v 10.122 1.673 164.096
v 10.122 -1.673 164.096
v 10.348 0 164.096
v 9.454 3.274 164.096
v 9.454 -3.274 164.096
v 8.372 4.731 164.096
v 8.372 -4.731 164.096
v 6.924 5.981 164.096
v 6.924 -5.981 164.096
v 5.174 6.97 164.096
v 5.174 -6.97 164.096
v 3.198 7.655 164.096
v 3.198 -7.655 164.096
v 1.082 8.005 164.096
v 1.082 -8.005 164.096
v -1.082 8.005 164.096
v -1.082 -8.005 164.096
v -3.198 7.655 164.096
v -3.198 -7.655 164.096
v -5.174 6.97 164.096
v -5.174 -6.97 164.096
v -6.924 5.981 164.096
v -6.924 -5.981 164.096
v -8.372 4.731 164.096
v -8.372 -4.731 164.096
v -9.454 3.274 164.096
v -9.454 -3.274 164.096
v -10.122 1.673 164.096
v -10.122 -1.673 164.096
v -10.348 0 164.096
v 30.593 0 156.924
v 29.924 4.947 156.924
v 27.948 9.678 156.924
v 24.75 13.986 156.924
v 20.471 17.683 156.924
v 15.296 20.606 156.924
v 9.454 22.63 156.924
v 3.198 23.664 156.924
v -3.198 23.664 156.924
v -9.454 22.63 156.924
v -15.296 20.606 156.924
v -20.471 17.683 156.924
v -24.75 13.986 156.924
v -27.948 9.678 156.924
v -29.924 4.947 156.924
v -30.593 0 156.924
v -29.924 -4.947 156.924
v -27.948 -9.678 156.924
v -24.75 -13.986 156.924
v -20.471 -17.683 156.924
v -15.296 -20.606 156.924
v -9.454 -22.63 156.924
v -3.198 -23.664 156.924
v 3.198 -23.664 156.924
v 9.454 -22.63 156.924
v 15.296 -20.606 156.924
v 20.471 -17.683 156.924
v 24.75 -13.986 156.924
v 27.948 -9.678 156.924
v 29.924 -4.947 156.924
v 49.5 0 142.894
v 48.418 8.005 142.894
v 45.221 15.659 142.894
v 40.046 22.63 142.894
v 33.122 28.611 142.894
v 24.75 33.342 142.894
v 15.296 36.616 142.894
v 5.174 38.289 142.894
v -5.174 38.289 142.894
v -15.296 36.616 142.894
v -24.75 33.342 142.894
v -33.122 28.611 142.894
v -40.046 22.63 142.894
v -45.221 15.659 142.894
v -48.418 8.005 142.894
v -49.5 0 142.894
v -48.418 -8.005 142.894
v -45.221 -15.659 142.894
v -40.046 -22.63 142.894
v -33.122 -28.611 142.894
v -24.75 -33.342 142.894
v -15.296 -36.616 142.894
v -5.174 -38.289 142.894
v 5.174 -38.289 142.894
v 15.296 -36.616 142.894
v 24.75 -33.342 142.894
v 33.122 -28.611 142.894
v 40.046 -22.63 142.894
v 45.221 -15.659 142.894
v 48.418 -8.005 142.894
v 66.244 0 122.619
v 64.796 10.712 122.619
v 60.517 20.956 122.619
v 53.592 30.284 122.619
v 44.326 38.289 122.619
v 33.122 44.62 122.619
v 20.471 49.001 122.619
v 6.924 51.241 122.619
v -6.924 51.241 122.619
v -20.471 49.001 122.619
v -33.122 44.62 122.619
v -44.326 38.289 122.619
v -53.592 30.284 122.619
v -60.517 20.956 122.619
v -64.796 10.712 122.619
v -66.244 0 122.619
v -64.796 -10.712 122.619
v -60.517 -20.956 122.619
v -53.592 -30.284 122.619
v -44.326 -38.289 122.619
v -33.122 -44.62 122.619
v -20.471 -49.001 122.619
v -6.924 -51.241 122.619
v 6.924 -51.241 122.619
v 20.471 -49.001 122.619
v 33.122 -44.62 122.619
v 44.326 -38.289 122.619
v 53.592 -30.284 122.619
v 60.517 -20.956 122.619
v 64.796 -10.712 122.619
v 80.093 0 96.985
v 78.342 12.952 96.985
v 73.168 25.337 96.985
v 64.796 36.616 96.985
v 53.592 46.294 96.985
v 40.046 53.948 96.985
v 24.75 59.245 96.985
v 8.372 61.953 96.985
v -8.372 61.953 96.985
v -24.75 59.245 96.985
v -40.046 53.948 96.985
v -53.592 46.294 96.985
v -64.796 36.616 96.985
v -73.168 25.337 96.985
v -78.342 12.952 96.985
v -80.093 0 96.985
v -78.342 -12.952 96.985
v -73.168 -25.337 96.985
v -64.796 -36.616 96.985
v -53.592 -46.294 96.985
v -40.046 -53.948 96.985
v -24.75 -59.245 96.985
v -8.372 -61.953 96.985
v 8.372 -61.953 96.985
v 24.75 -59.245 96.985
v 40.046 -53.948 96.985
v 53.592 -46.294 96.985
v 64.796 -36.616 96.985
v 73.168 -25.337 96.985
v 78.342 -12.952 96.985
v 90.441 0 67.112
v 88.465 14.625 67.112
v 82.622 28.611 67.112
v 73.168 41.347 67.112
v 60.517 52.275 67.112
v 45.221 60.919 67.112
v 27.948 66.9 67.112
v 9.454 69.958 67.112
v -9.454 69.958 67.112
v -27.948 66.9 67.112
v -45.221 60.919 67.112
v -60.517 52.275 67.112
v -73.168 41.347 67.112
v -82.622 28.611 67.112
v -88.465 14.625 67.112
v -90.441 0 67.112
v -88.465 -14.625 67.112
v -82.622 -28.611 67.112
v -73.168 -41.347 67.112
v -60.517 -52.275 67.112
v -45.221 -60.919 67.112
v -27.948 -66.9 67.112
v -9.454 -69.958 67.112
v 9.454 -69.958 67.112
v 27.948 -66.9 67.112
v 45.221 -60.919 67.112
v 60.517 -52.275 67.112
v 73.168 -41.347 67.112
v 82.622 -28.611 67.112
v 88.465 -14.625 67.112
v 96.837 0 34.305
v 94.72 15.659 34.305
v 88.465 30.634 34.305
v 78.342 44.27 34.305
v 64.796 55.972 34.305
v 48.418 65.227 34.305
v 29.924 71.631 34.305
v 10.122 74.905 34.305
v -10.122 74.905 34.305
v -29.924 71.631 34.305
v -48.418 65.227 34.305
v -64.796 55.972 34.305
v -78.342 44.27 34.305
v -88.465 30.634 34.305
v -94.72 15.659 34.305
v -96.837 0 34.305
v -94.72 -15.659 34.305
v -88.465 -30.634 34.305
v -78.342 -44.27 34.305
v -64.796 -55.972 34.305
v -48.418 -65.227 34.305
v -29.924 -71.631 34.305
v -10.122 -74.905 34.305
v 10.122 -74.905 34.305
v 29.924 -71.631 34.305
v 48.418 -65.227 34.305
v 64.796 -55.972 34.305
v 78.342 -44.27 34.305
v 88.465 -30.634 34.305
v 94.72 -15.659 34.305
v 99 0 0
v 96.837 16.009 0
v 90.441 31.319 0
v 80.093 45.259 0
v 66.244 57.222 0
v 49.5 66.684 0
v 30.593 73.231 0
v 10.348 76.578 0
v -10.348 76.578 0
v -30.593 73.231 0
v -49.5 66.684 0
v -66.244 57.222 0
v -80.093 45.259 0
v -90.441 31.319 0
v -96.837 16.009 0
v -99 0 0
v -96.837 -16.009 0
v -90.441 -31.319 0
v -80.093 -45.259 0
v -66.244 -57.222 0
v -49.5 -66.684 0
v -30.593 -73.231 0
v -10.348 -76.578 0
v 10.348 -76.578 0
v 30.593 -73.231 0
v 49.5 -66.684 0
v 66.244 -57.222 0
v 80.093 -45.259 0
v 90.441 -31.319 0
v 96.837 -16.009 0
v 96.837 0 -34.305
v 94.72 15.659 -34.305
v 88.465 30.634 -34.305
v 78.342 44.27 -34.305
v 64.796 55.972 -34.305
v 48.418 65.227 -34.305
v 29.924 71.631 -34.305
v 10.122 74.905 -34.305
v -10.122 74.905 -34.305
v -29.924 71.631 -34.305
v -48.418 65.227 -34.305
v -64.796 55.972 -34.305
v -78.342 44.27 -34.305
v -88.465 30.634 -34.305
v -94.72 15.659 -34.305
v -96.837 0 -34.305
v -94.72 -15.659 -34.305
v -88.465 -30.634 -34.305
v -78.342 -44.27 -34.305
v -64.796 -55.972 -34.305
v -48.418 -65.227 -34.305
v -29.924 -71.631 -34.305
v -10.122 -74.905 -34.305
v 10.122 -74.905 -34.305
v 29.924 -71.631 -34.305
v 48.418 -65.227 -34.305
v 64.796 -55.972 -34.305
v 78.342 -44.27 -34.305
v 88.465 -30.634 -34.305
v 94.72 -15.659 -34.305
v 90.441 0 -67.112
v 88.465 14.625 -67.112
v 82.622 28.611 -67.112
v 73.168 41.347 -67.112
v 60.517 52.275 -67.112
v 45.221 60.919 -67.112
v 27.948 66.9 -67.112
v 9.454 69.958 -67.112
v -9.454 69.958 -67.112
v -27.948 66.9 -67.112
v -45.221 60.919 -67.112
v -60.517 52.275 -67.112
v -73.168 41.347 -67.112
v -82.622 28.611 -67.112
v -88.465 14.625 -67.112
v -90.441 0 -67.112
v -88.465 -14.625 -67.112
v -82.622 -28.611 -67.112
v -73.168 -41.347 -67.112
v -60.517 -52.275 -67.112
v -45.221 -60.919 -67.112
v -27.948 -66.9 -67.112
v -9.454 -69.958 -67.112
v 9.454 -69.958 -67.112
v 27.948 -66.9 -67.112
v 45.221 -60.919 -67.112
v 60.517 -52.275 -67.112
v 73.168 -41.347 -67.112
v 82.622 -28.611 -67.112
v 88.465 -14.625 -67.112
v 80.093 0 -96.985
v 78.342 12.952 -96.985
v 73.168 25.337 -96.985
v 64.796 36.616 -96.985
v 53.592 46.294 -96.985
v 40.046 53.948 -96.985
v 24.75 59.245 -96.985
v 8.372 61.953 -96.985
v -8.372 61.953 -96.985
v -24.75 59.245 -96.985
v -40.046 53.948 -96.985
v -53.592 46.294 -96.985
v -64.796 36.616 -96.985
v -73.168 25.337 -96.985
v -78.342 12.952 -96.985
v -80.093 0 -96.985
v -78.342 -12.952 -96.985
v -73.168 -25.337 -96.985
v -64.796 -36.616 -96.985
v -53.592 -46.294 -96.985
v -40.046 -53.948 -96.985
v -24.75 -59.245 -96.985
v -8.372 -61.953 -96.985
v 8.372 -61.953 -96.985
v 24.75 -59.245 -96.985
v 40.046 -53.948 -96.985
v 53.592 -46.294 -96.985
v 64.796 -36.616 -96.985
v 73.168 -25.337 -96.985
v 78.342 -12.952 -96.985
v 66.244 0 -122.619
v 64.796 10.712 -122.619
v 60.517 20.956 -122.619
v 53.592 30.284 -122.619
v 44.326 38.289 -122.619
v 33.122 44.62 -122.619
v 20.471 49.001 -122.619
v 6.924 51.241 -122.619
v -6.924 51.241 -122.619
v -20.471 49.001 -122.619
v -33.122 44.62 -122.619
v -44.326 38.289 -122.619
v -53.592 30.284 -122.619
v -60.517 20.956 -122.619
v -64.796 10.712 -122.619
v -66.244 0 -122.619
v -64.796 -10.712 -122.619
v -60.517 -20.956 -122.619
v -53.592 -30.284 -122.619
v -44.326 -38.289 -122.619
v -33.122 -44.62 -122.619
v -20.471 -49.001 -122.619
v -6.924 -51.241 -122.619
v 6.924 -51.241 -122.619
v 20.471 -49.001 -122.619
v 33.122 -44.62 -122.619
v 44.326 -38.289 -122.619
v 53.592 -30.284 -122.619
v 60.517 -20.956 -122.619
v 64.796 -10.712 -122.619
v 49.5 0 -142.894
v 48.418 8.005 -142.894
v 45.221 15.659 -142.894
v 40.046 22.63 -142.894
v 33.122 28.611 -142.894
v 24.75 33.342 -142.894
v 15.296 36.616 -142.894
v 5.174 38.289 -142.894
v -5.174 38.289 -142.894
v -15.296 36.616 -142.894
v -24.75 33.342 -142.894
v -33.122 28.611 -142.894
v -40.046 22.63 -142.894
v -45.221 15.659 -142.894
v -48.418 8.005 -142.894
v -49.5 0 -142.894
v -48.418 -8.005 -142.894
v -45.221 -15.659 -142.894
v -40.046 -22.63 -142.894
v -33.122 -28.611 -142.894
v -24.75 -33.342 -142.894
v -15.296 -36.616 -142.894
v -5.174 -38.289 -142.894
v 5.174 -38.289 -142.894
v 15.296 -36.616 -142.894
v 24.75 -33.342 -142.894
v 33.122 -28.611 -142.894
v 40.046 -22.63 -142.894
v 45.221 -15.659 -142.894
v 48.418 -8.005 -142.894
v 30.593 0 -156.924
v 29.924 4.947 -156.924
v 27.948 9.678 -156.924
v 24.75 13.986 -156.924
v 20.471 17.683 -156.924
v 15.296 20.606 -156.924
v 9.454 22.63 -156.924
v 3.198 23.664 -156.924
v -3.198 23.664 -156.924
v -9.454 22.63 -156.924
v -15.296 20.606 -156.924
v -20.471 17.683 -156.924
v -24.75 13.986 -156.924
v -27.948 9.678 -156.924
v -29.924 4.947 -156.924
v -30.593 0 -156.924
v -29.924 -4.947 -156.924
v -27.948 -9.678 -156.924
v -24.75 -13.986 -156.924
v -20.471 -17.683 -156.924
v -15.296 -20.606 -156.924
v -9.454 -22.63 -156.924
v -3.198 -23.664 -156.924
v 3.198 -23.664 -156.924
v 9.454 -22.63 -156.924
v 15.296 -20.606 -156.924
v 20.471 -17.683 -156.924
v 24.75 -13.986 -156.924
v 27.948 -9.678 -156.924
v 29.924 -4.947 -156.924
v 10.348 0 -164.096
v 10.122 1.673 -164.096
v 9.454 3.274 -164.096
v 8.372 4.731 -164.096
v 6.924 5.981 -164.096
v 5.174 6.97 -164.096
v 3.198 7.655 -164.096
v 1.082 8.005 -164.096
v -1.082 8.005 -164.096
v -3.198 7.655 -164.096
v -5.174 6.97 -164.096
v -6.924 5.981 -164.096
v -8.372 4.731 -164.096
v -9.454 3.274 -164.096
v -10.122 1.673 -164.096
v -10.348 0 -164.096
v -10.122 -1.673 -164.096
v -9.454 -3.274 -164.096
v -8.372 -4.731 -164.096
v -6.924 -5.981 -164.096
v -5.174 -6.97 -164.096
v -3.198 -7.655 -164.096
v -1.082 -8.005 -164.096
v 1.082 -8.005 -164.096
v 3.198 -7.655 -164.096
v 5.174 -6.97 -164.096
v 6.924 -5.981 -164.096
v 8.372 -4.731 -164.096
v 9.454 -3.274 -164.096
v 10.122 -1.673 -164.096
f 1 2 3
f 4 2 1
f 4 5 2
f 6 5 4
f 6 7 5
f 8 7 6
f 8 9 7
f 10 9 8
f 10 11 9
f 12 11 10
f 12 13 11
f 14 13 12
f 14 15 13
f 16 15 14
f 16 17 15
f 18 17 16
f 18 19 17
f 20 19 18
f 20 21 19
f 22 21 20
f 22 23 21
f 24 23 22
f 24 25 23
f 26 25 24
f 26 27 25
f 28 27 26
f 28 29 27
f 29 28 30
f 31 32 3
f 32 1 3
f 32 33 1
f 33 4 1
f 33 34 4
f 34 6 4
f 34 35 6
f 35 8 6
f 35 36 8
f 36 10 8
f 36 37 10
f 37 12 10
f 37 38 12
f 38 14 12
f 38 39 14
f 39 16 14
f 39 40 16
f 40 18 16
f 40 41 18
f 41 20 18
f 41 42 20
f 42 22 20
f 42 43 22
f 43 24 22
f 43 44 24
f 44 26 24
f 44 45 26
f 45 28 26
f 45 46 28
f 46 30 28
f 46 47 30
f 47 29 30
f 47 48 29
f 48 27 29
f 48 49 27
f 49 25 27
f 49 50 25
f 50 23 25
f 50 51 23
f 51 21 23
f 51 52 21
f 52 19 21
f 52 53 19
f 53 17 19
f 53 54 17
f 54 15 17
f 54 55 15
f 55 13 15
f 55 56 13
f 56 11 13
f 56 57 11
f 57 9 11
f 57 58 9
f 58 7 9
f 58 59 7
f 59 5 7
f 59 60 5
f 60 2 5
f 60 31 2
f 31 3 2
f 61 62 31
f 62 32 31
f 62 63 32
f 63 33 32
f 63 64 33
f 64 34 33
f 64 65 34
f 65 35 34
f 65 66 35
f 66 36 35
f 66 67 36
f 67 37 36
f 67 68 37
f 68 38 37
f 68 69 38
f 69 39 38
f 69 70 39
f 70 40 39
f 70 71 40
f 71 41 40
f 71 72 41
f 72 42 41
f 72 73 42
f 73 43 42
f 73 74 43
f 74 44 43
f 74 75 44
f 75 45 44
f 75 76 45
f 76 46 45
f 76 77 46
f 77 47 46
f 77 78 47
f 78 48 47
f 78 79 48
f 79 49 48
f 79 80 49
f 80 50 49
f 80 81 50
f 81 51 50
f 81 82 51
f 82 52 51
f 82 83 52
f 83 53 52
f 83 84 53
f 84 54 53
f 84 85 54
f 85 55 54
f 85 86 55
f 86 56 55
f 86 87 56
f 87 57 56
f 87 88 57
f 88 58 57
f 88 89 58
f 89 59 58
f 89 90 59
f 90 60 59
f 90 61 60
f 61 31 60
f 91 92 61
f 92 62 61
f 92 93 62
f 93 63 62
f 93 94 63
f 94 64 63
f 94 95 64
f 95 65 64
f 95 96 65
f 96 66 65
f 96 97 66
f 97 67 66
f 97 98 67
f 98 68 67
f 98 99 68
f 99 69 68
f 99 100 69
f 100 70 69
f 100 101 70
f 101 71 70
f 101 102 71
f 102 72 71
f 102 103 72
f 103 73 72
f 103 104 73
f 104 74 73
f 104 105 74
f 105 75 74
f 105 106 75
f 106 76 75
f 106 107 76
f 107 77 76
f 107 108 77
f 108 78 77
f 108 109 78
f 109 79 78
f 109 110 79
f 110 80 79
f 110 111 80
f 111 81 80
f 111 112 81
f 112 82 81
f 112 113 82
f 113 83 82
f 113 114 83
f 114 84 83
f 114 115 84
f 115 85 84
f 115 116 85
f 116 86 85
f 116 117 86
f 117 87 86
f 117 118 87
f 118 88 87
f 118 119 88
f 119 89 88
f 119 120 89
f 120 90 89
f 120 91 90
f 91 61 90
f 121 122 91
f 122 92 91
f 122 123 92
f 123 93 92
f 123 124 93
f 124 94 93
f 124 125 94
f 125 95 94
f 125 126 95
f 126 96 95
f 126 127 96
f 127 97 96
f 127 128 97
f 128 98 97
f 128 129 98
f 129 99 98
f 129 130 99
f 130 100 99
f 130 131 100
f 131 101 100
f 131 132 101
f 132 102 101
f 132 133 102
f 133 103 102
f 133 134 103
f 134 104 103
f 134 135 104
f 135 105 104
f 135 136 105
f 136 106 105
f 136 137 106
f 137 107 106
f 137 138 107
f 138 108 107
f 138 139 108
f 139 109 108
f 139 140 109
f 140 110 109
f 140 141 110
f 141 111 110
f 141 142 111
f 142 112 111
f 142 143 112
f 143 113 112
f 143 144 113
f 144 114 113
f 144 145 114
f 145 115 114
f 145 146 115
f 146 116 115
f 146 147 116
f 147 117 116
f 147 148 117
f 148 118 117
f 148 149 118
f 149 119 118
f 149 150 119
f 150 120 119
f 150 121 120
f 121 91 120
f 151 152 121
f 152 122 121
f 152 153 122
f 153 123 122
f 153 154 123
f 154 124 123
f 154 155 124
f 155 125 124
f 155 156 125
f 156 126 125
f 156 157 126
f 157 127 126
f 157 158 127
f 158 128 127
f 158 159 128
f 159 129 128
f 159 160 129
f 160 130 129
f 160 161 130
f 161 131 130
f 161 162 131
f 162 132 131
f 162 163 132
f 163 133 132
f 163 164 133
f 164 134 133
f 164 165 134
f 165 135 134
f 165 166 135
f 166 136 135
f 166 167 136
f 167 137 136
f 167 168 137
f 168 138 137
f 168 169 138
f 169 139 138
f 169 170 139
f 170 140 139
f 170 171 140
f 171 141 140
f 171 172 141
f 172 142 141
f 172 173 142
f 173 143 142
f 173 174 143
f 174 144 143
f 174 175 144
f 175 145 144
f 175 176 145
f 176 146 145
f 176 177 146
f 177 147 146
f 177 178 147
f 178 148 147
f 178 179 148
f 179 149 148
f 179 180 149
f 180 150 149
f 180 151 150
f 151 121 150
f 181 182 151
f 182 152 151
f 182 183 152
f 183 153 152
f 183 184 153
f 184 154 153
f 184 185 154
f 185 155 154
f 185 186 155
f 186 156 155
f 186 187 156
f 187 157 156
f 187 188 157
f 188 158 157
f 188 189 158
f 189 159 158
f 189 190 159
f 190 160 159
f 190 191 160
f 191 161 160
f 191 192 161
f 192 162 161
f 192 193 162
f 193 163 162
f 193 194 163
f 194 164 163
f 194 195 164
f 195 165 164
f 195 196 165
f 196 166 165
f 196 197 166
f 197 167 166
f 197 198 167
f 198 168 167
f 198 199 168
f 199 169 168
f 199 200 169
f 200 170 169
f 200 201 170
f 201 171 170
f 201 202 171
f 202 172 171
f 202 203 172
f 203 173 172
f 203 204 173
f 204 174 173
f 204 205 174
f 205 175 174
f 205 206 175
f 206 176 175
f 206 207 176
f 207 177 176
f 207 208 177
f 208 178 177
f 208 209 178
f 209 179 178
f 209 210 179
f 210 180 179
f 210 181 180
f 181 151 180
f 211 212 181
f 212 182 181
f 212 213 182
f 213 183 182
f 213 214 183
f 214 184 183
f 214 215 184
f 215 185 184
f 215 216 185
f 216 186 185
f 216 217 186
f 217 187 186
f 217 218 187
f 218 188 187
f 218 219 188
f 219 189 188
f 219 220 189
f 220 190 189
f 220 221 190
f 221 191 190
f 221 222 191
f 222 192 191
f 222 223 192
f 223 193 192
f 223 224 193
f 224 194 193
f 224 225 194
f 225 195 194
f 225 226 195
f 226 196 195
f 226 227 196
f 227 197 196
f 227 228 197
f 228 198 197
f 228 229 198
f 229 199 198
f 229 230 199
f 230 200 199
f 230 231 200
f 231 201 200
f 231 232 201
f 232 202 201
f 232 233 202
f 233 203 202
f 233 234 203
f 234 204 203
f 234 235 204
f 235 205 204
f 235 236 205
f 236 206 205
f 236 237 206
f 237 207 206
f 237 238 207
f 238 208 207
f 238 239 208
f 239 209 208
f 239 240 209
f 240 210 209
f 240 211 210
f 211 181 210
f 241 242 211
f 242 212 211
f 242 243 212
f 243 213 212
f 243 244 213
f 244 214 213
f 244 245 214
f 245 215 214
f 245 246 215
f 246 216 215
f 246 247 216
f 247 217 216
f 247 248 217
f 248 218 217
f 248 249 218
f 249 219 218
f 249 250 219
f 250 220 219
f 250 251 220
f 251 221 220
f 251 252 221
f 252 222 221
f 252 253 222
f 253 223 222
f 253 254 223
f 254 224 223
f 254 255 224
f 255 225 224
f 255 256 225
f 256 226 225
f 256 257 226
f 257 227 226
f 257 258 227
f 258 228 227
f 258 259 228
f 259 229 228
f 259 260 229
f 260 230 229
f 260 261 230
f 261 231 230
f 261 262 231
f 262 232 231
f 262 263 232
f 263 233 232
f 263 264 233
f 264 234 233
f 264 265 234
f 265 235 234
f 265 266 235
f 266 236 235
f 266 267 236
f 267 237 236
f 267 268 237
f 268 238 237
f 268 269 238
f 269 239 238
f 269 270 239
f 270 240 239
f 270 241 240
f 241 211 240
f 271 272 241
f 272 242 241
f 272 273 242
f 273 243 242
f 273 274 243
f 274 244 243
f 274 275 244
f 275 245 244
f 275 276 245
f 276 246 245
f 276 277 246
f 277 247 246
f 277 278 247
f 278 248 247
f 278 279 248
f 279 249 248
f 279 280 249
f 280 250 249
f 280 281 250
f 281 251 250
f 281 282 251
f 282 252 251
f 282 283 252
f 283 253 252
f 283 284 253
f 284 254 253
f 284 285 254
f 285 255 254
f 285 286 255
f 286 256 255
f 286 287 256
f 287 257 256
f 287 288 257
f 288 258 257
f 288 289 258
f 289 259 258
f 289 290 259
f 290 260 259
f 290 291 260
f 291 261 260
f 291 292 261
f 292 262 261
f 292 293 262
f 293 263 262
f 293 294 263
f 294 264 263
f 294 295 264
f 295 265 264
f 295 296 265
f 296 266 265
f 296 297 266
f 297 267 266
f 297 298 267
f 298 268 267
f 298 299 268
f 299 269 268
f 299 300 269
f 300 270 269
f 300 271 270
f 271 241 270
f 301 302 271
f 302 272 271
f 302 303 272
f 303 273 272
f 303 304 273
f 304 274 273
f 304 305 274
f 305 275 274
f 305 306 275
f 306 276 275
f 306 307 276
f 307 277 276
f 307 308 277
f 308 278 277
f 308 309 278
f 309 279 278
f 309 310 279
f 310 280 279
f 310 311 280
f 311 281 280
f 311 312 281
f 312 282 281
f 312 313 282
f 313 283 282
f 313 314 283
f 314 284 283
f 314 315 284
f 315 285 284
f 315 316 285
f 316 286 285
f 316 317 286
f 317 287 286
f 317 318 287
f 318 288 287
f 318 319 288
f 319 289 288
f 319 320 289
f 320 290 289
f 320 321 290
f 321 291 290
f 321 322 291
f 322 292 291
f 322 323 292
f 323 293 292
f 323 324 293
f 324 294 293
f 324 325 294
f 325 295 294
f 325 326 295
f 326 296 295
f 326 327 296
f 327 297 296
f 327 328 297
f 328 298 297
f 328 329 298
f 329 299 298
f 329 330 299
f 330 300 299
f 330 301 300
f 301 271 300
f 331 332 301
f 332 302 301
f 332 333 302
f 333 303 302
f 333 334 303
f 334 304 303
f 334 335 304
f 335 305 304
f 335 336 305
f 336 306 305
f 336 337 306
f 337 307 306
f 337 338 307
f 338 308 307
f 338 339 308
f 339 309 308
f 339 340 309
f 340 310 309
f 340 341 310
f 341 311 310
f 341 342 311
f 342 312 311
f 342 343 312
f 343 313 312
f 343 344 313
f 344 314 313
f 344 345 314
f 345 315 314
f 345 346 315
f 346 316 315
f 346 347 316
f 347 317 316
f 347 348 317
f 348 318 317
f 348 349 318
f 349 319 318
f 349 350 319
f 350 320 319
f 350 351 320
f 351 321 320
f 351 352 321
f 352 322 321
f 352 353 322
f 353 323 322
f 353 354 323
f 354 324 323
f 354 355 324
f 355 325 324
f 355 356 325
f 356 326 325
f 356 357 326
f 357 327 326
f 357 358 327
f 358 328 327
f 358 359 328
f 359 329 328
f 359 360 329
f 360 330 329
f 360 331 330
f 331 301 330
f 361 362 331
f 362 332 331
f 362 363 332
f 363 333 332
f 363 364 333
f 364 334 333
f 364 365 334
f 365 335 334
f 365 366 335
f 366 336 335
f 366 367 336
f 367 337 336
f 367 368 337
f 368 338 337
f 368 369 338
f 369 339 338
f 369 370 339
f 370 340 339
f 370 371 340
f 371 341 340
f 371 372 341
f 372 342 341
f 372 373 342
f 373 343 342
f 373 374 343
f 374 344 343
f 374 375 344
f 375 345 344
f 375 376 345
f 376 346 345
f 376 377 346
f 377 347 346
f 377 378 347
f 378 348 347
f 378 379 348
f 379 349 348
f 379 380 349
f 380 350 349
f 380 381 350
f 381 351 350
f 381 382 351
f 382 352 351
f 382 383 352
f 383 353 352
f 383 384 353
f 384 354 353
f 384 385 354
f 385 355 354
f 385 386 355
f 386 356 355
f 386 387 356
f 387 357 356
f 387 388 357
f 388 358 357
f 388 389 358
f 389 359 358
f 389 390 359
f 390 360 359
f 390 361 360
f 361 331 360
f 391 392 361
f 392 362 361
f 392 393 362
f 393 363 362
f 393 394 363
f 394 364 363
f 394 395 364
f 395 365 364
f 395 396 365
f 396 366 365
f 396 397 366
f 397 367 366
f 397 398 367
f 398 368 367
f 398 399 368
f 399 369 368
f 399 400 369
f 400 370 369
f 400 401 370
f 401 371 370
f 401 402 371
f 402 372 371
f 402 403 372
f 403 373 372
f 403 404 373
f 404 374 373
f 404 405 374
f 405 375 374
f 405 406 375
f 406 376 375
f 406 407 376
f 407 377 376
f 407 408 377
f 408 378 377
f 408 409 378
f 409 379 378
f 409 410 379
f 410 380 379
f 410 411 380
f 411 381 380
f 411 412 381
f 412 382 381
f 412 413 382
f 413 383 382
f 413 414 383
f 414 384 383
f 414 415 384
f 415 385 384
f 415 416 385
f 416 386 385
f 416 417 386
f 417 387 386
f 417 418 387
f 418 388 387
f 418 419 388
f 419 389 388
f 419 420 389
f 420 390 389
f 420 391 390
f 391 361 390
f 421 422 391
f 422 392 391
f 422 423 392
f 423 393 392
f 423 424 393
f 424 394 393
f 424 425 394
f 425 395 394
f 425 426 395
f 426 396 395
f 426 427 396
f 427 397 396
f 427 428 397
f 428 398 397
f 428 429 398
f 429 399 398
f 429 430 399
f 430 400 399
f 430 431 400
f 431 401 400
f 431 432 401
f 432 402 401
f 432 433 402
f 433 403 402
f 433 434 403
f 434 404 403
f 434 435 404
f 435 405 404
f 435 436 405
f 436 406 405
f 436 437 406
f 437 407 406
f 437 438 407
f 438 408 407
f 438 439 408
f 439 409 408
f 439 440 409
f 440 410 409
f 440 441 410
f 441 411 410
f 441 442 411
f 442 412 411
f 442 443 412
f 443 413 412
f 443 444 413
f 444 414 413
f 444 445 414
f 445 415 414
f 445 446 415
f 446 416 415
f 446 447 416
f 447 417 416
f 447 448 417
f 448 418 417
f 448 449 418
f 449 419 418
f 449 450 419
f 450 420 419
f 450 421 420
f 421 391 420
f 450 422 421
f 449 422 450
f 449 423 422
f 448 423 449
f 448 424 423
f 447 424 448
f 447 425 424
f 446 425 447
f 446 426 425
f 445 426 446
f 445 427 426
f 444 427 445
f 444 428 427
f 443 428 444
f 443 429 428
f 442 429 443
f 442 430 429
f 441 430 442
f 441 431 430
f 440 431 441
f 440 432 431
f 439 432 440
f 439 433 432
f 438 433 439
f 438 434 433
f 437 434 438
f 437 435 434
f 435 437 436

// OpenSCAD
// Generated by SolidPython 1.0.1 on 2020-07-29 00:46:48


scale(v = [9, 7, 15]) {
	sphere(r = 11);
}
/***********************************************
*********      SolidPython code:      **********
************************************************
 
# import packages: SolidPython
from solid import *
from solid.utils import *
from itertools import chain, combinations, permutations


class Resize:

    def __init__(self, scad_file):
        self.scad_file = scad_file
        #self.scad_file = import_scad(scad_file)
        # cone/cylinder param:
        self.r1 = 0
        self.r2 = 0
        self.h = 0
        # rectangular prism param:
        self.w = 0
        self.l = 0
        # ellipse param:
        self.r = 0

    # import OpenScad code (file name corresponds to shape)


    # classify shape + parameters
    def assign(self, param1, param2, param3):
        if self.scad_file == 'cone.scad':
            self.r1 = param1
            self.r2 = param2
            self.h = param3
        elif self.scad_file == 'cylinder.scad':
            self.r1 = param1
            self.r2 = param2
            self.h = param3
        elif self.scad_file == 'rectangularPrism.scad':
            self.h = param1
            self.l = param2
            self.w = param3
        else:
            self.r = param1
            self.h = param2

    # resize parameters
    def iterate(self):
        x = range(3, 20, 2)
        i = 1
        if self.scad_file == 'cone.scad':
            tempList = list(permutations(x, 2))
            for temp in tempList:
                param1 = temp[0]
                param2 = temp[1]
                filepath = 'produced_scad_files/' + 'cone' + str(param1) + '_' + str(param2) + '_' + '.scad'
                scad_render_to_file(cylinder(h=param1, r1=param2, r2=0), filepath)

        elif self.scad_file == 'cylinder.scad':
            tempList = list(permutations(x, 3))
            for temp in tempList:
                param1 = temp[0]
                param2 = temp[1]
                filepath = 'produced_scad_files/' + 'cylinder' + str(param1) + '_' + str(param2) + '_' + '.scad'
                scad_render_to_file(cylinder(h=param1, r1=param2, r2=param2), filepath)

        elif self.scad_file == 'rectangularPrism.scad':
            tempList = list(permutations(x, 3))
            for temp in tempList:
                param1 = temp[0]
                param2 = temp[1]
                param3 = temp[2]
                filepath = 'produced_scad_files/' + 'rectangularPrism' + str(param1) + '_' + str(param2) + '_' + str(
                    param3) + '.scad'
                scad_render_to_file(cube(size=(param1, param2, param3)), filepath)

        elif self.scad_file == 'ellipse.scad':
            tempList = list(permutations(x, 4))
            for temp in tempList:
                param1 = temp[0]
                param2 = temp[1]
                param3 = temp[2]
                param4 = temp[3]
                filepath = 'produced_scad_files/' + 'ellipse' + str(param1) + '_' + str(param2) + '_' + str(param3) + '_' + str(param4) + '.scad'
                scad_render_to_file(scale([param1, param2, param3])(sphere(r=param4)), filepath)

    def render_to_scadfile(self):
        scad_render_to_file(scad, 'example.scad') 
 
************************************************/
